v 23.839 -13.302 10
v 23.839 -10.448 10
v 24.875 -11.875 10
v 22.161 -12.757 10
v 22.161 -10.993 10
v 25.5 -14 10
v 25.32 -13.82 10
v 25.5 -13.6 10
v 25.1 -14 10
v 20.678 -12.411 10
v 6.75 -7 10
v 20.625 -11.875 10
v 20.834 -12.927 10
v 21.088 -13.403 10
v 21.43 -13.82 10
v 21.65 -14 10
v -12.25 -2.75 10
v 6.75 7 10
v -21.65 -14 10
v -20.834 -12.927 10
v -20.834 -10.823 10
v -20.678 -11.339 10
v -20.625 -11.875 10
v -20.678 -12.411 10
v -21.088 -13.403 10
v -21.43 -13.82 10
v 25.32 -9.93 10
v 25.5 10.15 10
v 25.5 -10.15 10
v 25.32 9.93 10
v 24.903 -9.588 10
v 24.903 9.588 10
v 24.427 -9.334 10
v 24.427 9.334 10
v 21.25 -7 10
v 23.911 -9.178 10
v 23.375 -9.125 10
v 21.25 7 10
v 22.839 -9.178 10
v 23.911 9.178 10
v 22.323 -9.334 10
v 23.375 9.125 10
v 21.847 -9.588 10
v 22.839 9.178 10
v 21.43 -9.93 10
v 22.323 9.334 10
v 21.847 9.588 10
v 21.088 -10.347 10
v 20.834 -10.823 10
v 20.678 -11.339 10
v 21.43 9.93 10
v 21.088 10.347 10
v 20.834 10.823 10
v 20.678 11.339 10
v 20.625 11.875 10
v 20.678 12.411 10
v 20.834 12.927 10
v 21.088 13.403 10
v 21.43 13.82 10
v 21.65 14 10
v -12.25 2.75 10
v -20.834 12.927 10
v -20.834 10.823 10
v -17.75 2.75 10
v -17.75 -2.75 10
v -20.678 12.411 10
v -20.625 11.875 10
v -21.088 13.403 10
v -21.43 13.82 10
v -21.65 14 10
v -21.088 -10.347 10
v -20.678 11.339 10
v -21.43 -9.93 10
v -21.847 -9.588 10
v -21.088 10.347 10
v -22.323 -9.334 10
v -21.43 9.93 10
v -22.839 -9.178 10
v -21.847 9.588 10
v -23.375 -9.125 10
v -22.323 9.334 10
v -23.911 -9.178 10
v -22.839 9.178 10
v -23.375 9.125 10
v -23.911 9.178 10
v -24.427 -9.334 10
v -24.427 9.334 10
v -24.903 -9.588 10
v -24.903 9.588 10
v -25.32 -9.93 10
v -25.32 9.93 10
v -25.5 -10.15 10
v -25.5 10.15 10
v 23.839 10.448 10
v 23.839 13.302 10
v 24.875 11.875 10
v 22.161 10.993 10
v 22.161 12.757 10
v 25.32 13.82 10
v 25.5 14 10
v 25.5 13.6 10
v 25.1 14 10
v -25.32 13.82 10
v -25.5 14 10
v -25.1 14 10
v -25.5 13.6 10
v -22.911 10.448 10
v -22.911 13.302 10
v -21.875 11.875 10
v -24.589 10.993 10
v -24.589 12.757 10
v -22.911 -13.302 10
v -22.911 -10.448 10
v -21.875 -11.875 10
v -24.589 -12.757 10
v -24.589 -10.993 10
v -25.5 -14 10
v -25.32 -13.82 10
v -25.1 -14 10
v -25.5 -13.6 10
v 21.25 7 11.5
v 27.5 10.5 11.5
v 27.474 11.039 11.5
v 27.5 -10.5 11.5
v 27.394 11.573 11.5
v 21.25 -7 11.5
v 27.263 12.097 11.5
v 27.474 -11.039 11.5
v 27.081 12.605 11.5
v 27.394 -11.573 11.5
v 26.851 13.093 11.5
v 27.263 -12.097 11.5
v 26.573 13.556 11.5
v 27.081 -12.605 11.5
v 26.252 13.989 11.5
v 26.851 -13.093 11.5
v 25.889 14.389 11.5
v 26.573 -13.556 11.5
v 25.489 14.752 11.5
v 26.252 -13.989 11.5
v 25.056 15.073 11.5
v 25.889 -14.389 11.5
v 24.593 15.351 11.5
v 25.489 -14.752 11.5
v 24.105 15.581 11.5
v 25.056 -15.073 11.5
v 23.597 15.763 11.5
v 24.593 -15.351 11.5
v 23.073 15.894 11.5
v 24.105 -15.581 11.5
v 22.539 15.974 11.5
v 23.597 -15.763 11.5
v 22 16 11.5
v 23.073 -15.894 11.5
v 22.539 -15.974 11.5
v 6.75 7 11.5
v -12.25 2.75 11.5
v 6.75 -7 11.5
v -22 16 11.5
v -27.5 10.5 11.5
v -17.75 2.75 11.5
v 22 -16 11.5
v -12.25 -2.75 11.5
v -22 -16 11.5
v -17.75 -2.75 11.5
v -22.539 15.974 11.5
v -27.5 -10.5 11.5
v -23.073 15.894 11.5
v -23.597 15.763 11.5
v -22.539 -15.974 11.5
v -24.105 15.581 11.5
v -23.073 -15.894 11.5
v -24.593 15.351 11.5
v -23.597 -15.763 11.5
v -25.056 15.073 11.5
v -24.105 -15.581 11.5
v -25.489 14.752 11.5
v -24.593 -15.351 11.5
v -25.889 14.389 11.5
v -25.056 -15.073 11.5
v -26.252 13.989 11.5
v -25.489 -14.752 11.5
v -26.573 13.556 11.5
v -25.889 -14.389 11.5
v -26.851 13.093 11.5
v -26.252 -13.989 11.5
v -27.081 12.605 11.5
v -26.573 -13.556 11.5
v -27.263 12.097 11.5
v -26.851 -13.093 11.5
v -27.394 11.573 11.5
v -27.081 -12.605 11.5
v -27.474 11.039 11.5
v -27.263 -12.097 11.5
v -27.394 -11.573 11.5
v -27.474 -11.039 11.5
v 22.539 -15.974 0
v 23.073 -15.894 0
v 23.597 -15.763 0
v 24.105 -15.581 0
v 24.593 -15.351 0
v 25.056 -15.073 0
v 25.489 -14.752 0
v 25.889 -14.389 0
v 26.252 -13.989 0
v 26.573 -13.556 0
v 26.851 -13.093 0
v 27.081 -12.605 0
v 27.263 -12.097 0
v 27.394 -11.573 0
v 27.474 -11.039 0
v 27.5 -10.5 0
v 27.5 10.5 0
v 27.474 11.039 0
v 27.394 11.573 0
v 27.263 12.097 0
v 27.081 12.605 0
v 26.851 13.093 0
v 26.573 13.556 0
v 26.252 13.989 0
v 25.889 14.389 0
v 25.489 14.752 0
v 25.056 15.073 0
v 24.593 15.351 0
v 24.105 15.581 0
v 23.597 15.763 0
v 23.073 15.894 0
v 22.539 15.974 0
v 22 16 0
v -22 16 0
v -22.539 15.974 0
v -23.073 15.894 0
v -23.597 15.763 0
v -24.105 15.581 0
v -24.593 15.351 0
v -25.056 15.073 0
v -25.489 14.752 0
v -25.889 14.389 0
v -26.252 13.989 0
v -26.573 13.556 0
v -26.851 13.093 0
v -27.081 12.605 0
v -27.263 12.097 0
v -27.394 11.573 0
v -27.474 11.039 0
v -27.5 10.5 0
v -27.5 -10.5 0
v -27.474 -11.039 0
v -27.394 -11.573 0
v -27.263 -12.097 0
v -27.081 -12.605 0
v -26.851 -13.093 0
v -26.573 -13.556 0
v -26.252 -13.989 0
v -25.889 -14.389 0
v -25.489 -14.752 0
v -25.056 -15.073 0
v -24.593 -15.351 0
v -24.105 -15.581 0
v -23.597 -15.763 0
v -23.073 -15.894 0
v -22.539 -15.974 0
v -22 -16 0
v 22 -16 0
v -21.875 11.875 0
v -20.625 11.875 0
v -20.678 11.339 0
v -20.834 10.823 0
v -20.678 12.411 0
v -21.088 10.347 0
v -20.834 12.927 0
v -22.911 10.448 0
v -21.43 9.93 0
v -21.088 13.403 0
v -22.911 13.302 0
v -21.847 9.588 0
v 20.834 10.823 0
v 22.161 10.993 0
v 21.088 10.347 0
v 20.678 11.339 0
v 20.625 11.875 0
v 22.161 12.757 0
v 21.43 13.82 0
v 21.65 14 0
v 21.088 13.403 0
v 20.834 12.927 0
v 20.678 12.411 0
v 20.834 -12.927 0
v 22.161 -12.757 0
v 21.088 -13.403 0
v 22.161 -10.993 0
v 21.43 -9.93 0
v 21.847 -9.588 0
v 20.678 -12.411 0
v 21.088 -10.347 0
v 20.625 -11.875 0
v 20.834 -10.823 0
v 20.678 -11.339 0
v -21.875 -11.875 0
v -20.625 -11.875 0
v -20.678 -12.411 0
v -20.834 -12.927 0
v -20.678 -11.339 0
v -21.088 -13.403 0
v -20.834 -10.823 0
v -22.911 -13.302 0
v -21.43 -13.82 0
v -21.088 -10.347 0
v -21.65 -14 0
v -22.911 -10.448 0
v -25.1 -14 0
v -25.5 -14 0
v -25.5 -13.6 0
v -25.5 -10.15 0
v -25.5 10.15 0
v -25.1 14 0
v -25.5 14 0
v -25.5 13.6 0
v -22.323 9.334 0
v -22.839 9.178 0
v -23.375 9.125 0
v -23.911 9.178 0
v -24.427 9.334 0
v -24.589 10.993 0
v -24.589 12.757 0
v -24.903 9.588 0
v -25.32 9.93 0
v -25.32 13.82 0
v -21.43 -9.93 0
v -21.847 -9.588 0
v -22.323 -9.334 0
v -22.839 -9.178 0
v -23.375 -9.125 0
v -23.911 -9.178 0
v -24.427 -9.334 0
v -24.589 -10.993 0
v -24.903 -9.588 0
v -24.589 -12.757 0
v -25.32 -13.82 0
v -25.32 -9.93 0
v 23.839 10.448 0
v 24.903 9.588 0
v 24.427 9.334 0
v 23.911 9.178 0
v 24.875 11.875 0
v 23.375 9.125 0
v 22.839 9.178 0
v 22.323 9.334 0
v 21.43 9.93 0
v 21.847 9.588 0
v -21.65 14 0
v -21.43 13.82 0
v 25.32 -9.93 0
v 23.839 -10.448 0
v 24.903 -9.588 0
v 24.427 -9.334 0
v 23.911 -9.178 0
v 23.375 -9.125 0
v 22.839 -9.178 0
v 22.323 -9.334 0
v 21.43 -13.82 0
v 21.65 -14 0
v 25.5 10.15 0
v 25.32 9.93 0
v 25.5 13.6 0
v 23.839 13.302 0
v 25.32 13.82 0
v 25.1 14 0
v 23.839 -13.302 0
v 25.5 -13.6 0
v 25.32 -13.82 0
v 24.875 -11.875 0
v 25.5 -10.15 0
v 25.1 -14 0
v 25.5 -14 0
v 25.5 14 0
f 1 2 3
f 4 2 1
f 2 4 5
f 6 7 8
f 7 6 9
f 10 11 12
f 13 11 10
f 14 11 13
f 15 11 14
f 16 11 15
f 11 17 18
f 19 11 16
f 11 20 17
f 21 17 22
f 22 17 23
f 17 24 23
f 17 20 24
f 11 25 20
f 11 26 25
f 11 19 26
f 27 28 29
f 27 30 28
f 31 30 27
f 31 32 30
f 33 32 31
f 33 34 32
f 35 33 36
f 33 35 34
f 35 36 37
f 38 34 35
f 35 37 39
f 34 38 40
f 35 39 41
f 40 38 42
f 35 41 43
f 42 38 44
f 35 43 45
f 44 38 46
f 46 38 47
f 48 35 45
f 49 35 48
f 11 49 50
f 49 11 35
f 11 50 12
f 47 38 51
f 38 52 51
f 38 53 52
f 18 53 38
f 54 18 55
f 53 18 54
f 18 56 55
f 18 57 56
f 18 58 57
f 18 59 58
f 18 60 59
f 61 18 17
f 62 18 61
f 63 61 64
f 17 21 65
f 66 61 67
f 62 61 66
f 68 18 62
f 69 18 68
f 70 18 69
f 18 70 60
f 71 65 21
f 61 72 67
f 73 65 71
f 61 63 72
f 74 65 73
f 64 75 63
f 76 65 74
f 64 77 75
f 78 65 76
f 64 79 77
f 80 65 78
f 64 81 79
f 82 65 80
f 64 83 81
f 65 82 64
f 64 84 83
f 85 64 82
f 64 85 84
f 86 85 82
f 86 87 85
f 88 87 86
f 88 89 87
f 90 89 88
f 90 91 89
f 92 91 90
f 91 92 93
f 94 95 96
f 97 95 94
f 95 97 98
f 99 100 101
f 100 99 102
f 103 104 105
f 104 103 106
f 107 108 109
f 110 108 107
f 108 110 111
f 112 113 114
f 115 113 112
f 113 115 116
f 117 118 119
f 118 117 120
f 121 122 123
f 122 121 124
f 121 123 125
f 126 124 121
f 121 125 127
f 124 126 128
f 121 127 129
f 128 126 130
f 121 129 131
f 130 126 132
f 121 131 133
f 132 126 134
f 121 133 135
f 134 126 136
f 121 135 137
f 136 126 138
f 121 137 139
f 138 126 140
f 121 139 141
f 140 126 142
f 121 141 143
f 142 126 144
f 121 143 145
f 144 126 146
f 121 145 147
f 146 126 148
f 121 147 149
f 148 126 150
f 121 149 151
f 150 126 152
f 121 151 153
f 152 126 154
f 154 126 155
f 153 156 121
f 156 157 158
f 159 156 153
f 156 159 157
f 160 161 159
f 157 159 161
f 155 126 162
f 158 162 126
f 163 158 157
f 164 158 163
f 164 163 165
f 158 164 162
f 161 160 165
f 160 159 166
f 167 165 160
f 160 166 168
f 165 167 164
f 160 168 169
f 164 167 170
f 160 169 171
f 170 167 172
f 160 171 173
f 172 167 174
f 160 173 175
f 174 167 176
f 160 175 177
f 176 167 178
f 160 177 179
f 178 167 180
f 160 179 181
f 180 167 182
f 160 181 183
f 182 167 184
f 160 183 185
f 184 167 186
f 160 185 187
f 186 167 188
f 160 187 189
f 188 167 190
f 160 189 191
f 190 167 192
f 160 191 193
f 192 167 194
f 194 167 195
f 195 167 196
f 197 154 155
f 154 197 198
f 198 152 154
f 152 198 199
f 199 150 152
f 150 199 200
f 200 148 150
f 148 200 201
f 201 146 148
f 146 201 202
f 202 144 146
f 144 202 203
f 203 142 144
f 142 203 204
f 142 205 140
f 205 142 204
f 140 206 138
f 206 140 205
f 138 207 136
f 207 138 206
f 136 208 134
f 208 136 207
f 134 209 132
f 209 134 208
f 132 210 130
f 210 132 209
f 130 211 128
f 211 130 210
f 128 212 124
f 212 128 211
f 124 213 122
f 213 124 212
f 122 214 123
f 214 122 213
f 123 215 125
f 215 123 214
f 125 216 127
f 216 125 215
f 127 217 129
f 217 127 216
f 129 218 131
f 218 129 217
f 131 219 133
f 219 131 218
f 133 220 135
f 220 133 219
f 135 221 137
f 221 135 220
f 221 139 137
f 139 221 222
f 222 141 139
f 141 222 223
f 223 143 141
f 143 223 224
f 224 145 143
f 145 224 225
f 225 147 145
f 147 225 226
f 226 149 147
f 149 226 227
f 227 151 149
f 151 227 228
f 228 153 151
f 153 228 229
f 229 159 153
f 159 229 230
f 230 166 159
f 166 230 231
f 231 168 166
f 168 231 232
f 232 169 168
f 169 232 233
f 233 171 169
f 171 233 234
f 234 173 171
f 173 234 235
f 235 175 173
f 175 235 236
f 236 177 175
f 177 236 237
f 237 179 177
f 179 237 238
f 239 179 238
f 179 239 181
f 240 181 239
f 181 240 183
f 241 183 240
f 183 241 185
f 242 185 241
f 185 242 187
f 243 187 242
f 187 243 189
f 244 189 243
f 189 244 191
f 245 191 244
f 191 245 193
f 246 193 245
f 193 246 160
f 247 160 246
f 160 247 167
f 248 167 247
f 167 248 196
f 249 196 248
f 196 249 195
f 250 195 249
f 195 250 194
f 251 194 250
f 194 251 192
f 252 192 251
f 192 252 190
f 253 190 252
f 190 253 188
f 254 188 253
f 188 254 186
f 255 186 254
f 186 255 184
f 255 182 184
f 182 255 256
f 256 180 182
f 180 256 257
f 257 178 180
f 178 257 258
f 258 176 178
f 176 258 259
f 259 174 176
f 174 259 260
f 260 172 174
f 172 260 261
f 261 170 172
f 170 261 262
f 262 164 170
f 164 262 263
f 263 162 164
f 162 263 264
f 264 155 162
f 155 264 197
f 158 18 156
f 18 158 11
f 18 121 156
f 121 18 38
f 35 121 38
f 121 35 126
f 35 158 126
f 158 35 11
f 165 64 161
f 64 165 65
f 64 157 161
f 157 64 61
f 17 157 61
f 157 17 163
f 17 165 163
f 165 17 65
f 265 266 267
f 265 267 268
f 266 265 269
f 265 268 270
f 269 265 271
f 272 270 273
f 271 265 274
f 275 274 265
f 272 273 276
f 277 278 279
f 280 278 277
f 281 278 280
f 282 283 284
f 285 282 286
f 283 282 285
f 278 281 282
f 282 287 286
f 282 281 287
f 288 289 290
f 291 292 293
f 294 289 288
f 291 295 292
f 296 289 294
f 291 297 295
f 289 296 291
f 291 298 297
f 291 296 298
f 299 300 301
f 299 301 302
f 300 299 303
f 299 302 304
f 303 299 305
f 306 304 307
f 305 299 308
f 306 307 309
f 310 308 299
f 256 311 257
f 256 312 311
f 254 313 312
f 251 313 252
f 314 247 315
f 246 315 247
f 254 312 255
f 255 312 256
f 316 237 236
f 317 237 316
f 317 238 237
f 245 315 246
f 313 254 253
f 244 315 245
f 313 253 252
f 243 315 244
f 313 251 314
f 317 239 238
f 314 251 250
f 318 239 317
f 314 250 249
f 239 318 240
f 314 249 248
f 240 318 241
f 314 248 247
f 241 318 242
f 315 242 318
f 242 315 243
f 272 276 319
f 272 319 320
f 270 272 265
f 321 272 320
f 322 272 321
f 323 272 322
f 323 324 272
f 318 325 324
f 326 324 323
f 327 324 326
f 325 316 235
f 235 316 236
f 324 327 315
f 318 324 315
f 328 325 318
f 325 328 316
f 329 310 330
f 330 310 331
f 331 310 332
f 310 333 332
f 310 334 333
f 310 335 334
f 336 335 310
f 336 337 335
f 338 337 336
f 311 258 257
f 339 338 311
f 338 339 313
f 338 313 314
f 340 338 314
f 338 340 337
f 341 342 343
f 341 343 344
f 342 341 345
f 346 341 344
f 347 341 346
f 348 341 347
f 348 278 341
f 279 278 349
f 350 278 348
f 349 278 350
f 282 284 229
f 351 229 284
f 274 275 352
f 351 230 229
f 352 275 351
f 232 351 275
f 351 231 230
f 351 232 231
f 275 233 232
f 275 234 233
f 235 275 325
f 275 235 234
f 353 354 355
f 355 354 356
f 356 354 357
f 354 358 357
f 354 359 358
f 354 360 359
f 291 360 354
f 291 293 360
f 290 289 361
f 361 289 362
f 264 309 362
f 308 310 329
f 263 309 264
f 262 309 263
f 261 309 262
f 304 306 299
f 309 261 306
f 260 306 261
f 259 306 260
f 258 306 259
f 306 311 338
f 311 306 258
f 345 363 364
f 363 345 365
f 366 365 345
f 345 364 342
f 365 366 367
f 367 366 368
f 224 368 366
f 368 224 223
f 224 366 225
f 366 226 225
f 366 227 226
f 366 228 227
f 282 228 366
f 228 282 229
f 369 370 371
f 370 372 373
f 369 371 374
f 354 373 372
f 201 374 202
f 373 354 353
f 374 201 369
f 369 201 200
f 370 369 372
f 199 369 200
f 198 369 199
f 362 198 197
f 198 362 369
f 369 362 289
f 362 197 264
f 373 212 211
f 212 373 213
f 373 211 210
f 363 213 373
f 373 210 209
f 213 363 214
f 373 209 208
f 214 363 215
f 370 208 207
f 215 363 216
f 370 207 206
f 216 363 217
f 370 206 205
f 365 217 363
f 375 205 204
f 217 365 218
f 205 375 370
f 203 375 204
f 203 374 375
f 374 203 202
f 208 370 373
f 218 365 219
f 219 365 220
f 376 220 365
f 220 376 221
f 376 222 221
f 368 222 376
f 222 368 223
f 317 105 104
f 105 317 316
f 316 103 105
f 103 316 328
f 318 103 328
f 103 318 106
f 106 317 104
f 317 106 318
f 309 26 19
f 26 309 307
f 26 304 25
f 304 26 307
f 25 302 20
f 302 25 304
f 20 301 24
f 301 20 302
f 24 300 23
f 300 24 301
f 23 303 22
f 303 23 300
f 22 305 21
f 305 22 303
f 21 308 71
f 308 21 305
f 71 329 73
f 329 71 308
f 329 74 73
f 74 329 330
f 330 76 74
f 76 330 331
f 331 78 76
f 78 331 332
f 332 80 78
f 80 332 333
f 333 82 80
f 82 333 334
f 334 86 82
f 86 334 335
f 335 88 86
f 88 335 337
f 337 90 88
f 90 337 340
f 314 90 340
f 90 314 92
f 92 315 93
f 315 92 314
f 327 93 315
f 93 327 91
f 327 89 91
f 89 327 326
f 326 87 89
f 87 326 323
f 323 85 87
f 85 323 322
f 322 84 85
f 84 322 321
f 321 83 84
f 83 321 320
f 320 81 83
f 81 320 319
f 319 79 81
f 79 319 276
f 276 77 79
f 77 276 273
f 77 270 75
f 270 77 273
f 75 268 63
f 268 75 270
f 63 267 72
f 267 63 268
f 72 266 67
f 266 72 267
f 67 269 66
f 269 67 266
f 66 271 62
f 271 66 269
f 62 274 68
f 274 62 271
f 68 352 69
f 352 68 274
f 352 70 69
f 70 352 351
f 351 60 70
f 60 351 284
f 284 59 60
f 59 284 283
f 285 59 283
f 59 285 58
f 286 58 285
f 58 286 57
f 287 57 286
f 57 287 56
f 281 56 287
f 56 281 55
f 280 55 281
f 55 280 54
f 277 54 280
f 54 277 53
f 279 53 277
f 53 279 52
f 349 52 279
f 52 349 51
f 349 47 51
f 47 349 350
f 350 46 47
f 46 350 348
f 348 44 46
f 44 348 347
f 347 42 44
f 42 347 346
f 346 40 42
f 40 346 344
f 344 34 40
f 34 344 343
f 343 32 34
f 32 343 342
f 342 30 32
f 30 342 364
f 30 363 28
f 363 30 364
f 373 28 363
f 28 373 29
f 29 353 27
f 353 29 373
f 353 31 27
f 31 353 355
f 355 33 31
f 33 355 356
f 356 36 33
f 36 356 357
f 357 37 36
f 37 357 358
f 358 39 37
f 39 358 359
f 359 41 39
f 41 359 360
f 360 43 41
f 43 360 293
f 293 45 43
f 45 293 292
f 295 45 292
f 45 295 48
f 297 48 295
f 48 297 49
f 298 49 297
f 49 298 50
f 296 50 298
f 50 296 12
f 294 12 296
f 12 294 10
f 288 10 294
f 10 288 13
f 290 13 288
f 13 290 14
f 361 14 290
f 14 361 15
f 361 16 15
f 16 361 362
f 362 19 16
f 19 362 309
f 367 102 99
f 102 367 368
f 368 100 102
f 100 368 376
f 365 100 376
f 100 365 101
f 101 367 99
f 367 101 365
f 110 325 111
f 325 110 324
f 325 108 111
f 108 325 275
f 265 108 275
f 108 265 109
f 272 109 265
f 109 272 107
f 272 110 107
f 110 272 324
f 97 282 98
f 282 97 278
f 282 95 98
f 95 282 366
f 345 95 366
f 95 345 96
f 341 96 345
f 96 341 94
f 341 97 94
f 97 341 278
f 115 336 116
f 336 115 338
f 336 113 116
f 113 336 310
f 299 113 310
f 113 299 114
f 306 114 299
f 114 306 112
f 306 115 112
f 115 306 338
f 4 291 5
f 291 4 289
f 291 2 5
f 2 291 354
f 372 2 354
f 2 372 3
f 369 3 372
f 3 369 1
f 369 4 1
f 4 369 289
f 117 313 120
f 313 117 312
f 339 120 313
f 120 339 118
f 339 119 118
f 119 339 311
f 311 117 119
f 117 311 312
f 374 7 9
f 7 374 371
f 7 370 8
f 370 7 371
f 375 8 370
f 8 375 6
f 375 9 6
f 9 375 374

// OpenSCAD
// file: ../dimensions.scad
outer_dimensions = [55, 32];
outer_radius = 5.5;
wall = 2;

mounting_hole_centres = outer_dimensions - (1.5 * [outer_radius, outer_radius]);
hole_support = 5.5;

upper_plate = 1.5;
upper_height = 10;

lower_plate = 1.5;
lower_height = 6;
// file: ../common.scad
module PlaceAtCentres(centres)
{
  dx = centres[0] / 2;
  dy = centres[1] / 2;

  for(x = [-dx, dx])
  {
    for(y = [-dy, dy])
    {
      translate([x, y])
      {
        children();
      }
    }
  }
}

module OuterProjection(size, radius)
{
  centres = size - (2 * [radius, radius]);

  hull()
  {
    PlaceAtCentres(centres)
    {
      circle(r=radius, $fn=64);
    }
  }
}

module MountHoles(centres, support_diameter, hole_diameter, hole_edges)
{
  difference()
  {
    PlaceAtCentres(centres)
    {
      circle(d=support_diameter, $fn=32);
    }

    PlaceAtCentres(centres)
    {
      circle(d=hole_diameter, $fn=hole_edges);
    }
  }
}

module InnerProjection(size, wall_thickness, radius, hole_centres, support_diameter, hole_diameter, hole_edges)
{
  difference()
  {
    OuterProjection(size, radius);
    square(size - (2 * [wall_thickness, wall_thickness]), center=true);
  }
  MountHoles(hole_centres, support_diameter, hole_diameter, hole_edges);
}

module LowerPlate(size, radius, hole_centres, hole_diameter, hole_edges)
{
  difference()
  {
    OuterProjection(size, radius);

    PlaceAtCentres(hole_centres)
    {
      circle(d=hole_diameter, $fn=hole_edges);
    }
  }
}
// main file
use <../common.scad>
include <../dimensions.scad>

module Upper()
{
  translate([0, 0, upper_height])
  {
    color("red")
    {
      linear_extrude(upper_plate)
      {
        difference()
        {
          OuterProjection(outer_dimensions, outer_radius);

          /* NeoPixel cutout */
          translate([-15, 0])
          {
            square([5.5, 5.5], center=true);
          }

          /* Cherry switch cutout */
          translate([14, 0])
          {
            square([14.5, 14], center=true);
          }
        }
      }
    }
  }

  color("green")
  {
    linear_extrude(upper_height)
    {
      InnerProjection(outer_dimensions, wall, outer_radius, mounting_hole_centres, hole_support, 3, 5);
    }
  }
}

Upper();
